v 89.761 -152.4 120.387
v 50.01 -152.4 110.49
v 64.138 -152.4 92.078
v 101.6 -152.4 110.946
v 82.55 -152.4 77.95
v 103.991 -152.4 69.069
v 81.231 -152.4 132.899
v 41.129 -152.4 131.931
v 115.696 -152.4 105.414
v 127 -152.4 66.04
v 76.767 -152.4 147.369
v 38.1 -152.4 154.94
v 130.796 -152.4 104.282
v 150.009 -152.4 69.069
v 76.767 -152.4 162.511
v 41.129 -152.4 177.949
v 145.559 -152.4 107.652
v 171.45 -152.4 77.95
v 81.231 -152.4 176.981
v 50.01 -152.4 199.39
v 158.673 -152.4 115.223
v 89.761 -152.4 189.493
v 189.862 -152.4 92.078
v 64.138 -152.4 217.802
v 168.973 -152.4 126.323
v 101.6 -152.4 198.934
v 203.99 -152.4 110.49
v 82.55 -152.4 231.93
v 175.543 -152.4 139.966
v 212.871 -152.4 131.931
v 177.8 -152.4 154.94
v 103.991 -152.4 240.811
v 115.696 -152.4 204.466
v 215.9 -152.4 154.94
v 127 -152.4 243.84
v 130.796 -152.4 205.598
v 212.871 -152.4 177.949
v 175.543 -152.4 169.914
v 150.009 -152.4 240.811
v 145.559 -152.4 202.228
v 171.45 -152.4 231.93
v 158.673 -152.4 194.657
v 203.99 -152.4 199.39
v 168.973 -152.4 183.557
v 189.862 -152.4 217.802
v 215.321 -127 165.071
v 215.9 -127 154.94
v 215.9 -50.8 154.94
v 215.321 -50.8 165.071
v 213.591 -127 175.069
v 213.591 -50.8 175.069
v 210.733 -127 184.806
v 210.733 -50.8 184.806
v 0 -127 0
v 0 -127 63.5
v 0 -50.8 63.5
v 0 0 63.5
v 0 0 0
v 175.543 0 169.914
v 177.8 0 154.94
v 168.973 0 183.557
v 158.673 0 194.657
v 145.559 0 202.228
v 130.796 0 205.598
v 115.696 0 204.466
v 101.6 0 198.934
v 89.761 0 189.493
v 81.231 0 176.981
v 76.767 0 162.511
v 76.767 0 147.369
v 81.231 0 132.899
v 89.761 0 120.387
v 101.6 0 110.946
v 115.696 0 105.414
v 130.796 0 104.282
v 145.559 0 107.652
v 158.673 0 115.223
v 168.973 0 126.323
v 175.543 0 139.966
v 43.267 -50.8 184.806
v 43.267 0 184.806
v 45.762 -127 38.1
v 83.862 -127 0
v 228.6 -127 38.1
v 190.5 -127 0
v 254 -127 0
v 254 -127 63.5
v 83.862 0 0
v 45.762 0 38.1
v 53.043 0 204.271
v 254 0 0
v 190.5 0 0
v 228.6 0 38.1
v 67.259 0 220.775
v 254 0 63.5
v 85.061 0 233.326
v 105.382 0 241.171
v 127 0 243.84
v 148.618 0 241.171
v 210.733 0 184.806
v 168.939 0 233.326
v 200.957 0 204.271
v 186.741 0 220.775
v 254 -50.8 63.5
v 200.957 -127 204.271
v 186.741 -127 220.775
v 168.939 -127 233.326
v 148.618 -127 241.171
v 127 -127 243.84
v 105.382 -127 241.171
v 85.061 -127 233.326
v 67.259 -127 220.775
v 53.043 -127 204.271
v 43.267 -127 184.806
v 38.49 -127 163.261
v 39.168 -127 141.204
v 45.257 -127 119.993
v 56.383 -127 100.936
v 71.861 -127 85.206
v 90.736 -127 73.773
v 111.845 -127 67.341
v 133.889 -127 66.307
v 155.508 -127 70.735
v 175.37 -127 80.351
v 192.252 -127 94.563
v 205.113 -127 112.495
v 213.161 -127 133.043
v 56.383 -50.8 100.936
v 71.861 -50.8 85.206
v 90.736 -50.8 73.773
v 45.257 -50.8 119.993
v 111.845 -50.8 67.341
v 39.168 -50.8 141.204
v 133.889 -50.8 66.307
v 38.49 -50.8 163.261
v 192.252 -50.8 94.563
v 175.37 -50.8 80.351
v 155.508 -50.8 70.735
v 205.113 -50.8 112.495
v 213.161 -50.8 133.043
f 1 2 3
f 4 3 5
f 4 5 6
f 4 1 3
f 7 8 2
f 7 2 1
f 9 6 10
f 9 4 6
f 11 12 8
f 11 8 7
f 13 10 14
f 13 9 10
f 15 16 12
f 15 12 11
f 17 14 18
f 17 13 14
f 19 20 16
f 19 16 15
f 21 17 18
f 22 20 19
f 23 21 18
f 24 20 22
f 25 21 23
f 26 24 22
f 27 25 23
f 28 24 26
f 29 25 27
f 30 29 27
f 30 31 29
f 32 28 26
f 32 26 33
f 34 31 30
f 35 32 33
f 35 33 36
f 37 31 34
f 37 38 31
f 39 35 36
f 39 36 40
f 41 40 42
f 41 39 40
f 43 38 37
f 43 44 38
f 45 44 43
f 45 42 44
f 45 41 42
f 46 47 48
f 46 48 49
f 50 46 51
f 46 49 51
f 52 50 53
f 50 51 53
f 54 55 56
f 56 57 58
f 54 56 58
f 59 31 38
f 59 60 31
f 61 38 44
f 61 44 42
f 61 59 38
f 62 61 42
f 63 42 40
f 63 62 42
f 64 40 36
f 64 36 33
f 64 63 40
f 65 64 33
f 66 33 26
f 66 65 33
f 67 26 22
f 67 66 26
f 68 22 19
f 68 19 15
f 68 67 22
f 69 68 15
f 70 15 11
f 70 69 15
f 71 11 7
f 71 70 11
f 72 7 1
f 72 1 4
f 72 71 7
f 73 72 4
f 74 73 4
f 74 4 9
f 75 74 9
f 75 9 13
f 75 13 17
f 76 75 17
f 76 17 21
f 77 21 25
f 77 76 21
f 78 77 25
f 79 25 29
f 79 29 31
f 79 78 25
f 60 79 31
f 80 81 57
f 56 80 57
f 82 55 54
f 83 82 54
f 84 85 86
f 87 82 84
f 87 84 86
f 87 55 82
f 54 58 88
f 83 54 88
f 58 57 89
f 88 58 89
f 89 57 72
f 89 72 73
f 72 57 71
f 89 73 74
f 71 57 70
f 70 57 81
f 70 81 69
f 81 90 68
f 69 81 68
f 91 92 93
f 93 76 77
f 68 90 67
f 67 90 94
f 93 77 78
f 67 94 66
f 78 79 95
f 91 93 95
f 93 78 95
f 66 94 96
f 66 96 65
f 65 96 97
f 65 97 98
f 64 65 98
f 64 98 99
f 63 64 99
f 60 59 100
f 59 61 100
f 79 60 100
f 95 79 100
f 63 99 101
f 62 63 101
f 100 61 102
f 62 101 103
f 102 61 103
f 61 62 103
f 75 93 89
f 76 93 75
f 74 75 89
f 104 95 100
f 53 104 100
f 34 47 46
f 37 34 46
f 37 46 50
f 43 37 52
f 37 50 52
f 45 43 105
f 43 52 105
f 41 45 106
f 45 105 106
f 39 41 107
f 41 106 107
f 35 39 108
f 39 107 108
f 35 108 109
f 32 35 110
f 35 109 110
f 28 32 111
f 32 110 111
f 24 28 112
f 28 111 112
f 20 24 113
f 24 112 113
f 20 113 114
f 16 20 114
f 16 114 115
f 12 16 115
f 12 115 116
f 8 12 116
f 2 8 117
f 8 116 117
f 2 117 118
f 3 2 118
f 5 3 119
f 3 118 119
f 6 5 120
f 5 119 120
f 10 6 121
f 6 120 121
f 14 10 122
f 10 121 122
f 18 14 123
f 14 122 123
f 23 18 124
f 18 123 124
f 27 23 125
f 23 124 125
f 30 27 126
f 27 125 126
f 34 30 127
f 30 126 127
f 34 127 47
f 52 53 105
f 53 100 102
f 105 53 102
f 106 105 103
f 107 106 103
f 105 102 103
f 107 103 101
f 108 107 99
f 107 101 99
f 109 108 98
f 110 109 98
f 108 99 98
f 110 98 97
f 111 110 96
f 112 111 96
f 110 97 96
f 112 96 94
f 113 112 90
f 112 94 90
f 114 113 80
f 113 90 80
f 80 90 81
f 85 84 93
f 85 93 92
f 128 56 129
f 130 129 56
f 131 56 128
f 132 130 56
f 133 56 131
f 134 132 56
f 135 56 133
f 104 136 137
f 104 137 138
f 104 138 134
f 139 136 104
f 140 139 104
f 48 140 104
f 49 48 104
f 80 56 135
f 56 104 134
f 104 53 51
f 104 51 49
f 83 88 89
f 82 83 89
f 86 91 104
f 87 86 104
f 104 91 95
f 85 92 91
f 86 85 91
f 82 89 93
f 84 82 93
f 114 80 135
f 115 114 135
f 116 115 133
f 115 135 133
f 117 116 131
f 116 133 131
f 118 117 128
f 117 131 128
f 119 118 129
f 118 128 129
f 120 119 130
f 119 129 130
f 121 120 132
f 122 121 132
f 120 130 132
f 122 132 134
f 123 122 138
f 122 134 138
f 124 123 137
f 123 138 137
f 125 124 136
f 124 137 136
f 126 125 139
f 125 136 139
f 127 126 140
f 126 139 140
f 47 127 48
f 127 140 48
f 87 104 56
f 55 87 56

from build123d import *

# Parameters (mm, degrees)
F0_R        = 50.8
F1_DEPTH    = 127
F1_FACE_R   = 88.9
F1_FACE_R_2 = 50.8
F2_DEPTH    = 25.4
F3_DEPTH    = 50.8
F4_DEPTH    = 127


with BuildPart() as f1:
    # F0 (on Front) → F1 (new body)
    with BuildSketch(Plane.XZ):
        with BuildLine():
            ThreePointArc((210.733239, 184.80561), (127, 243.84), (43.266761, 184.80561))
            ThreePointArc((43.266761, 184.80561), (111.84538, 67.341213), (215.9, 154.94))
            ThreePointArc((215.9, 154.94), (214.598787, 170.09462), (210.733239, 184.80561))
        make_face()
        with Locations((127, 154.94)):
            Circle(F0_R, mode=Mode.SUBTRACT)
    extrude(amount=F1_DEPTH)

    # F1_face (on face) → F2 (join)
    with BuildSketch(Plane(origin=(127, -127, 154.94), x_dir=(1, 0, 0), z_dir=(0, -1, 0))):
        Circle(F1_FACE_R)
        Circle(F1_FACE_R_2, mode=Mode.SUBTRACT)
    extrude(amount=F2_DEPTH)

    # F0 (on Front) → F3 (join)
    with BuildSketch(Plane.XZ):
        with BuildLine():
            Line((43.266761, 184.80561), (0, 63.5))
            Line((0, 63.5), (254, 63.5))
            Line((254, 63.5), (210.733239, 184.80561))
            ThreePointArc((210.733239, 184.80561), (214.598787, 170.09462), (215.9, 154.94))
            ThreePointArc((215.9, 154.94), (111.84538, 67.341213), (43.266761, 184.80561))
        make_face()
    extrude(amount=F3_DEPTH)

    # F0 (on Front) → F4 (join)
    with BuildSketch(Plane.XZ):
        Polygon((0, 63.5), (0, 0), (83.8623, 0), (45.7623, 38.1), (228.6, 38.1), (190.5, 0), (254, 0), (254, 63.5), align=None)
    extrude(amount=F4_DEPTH)


solid = f1.part
